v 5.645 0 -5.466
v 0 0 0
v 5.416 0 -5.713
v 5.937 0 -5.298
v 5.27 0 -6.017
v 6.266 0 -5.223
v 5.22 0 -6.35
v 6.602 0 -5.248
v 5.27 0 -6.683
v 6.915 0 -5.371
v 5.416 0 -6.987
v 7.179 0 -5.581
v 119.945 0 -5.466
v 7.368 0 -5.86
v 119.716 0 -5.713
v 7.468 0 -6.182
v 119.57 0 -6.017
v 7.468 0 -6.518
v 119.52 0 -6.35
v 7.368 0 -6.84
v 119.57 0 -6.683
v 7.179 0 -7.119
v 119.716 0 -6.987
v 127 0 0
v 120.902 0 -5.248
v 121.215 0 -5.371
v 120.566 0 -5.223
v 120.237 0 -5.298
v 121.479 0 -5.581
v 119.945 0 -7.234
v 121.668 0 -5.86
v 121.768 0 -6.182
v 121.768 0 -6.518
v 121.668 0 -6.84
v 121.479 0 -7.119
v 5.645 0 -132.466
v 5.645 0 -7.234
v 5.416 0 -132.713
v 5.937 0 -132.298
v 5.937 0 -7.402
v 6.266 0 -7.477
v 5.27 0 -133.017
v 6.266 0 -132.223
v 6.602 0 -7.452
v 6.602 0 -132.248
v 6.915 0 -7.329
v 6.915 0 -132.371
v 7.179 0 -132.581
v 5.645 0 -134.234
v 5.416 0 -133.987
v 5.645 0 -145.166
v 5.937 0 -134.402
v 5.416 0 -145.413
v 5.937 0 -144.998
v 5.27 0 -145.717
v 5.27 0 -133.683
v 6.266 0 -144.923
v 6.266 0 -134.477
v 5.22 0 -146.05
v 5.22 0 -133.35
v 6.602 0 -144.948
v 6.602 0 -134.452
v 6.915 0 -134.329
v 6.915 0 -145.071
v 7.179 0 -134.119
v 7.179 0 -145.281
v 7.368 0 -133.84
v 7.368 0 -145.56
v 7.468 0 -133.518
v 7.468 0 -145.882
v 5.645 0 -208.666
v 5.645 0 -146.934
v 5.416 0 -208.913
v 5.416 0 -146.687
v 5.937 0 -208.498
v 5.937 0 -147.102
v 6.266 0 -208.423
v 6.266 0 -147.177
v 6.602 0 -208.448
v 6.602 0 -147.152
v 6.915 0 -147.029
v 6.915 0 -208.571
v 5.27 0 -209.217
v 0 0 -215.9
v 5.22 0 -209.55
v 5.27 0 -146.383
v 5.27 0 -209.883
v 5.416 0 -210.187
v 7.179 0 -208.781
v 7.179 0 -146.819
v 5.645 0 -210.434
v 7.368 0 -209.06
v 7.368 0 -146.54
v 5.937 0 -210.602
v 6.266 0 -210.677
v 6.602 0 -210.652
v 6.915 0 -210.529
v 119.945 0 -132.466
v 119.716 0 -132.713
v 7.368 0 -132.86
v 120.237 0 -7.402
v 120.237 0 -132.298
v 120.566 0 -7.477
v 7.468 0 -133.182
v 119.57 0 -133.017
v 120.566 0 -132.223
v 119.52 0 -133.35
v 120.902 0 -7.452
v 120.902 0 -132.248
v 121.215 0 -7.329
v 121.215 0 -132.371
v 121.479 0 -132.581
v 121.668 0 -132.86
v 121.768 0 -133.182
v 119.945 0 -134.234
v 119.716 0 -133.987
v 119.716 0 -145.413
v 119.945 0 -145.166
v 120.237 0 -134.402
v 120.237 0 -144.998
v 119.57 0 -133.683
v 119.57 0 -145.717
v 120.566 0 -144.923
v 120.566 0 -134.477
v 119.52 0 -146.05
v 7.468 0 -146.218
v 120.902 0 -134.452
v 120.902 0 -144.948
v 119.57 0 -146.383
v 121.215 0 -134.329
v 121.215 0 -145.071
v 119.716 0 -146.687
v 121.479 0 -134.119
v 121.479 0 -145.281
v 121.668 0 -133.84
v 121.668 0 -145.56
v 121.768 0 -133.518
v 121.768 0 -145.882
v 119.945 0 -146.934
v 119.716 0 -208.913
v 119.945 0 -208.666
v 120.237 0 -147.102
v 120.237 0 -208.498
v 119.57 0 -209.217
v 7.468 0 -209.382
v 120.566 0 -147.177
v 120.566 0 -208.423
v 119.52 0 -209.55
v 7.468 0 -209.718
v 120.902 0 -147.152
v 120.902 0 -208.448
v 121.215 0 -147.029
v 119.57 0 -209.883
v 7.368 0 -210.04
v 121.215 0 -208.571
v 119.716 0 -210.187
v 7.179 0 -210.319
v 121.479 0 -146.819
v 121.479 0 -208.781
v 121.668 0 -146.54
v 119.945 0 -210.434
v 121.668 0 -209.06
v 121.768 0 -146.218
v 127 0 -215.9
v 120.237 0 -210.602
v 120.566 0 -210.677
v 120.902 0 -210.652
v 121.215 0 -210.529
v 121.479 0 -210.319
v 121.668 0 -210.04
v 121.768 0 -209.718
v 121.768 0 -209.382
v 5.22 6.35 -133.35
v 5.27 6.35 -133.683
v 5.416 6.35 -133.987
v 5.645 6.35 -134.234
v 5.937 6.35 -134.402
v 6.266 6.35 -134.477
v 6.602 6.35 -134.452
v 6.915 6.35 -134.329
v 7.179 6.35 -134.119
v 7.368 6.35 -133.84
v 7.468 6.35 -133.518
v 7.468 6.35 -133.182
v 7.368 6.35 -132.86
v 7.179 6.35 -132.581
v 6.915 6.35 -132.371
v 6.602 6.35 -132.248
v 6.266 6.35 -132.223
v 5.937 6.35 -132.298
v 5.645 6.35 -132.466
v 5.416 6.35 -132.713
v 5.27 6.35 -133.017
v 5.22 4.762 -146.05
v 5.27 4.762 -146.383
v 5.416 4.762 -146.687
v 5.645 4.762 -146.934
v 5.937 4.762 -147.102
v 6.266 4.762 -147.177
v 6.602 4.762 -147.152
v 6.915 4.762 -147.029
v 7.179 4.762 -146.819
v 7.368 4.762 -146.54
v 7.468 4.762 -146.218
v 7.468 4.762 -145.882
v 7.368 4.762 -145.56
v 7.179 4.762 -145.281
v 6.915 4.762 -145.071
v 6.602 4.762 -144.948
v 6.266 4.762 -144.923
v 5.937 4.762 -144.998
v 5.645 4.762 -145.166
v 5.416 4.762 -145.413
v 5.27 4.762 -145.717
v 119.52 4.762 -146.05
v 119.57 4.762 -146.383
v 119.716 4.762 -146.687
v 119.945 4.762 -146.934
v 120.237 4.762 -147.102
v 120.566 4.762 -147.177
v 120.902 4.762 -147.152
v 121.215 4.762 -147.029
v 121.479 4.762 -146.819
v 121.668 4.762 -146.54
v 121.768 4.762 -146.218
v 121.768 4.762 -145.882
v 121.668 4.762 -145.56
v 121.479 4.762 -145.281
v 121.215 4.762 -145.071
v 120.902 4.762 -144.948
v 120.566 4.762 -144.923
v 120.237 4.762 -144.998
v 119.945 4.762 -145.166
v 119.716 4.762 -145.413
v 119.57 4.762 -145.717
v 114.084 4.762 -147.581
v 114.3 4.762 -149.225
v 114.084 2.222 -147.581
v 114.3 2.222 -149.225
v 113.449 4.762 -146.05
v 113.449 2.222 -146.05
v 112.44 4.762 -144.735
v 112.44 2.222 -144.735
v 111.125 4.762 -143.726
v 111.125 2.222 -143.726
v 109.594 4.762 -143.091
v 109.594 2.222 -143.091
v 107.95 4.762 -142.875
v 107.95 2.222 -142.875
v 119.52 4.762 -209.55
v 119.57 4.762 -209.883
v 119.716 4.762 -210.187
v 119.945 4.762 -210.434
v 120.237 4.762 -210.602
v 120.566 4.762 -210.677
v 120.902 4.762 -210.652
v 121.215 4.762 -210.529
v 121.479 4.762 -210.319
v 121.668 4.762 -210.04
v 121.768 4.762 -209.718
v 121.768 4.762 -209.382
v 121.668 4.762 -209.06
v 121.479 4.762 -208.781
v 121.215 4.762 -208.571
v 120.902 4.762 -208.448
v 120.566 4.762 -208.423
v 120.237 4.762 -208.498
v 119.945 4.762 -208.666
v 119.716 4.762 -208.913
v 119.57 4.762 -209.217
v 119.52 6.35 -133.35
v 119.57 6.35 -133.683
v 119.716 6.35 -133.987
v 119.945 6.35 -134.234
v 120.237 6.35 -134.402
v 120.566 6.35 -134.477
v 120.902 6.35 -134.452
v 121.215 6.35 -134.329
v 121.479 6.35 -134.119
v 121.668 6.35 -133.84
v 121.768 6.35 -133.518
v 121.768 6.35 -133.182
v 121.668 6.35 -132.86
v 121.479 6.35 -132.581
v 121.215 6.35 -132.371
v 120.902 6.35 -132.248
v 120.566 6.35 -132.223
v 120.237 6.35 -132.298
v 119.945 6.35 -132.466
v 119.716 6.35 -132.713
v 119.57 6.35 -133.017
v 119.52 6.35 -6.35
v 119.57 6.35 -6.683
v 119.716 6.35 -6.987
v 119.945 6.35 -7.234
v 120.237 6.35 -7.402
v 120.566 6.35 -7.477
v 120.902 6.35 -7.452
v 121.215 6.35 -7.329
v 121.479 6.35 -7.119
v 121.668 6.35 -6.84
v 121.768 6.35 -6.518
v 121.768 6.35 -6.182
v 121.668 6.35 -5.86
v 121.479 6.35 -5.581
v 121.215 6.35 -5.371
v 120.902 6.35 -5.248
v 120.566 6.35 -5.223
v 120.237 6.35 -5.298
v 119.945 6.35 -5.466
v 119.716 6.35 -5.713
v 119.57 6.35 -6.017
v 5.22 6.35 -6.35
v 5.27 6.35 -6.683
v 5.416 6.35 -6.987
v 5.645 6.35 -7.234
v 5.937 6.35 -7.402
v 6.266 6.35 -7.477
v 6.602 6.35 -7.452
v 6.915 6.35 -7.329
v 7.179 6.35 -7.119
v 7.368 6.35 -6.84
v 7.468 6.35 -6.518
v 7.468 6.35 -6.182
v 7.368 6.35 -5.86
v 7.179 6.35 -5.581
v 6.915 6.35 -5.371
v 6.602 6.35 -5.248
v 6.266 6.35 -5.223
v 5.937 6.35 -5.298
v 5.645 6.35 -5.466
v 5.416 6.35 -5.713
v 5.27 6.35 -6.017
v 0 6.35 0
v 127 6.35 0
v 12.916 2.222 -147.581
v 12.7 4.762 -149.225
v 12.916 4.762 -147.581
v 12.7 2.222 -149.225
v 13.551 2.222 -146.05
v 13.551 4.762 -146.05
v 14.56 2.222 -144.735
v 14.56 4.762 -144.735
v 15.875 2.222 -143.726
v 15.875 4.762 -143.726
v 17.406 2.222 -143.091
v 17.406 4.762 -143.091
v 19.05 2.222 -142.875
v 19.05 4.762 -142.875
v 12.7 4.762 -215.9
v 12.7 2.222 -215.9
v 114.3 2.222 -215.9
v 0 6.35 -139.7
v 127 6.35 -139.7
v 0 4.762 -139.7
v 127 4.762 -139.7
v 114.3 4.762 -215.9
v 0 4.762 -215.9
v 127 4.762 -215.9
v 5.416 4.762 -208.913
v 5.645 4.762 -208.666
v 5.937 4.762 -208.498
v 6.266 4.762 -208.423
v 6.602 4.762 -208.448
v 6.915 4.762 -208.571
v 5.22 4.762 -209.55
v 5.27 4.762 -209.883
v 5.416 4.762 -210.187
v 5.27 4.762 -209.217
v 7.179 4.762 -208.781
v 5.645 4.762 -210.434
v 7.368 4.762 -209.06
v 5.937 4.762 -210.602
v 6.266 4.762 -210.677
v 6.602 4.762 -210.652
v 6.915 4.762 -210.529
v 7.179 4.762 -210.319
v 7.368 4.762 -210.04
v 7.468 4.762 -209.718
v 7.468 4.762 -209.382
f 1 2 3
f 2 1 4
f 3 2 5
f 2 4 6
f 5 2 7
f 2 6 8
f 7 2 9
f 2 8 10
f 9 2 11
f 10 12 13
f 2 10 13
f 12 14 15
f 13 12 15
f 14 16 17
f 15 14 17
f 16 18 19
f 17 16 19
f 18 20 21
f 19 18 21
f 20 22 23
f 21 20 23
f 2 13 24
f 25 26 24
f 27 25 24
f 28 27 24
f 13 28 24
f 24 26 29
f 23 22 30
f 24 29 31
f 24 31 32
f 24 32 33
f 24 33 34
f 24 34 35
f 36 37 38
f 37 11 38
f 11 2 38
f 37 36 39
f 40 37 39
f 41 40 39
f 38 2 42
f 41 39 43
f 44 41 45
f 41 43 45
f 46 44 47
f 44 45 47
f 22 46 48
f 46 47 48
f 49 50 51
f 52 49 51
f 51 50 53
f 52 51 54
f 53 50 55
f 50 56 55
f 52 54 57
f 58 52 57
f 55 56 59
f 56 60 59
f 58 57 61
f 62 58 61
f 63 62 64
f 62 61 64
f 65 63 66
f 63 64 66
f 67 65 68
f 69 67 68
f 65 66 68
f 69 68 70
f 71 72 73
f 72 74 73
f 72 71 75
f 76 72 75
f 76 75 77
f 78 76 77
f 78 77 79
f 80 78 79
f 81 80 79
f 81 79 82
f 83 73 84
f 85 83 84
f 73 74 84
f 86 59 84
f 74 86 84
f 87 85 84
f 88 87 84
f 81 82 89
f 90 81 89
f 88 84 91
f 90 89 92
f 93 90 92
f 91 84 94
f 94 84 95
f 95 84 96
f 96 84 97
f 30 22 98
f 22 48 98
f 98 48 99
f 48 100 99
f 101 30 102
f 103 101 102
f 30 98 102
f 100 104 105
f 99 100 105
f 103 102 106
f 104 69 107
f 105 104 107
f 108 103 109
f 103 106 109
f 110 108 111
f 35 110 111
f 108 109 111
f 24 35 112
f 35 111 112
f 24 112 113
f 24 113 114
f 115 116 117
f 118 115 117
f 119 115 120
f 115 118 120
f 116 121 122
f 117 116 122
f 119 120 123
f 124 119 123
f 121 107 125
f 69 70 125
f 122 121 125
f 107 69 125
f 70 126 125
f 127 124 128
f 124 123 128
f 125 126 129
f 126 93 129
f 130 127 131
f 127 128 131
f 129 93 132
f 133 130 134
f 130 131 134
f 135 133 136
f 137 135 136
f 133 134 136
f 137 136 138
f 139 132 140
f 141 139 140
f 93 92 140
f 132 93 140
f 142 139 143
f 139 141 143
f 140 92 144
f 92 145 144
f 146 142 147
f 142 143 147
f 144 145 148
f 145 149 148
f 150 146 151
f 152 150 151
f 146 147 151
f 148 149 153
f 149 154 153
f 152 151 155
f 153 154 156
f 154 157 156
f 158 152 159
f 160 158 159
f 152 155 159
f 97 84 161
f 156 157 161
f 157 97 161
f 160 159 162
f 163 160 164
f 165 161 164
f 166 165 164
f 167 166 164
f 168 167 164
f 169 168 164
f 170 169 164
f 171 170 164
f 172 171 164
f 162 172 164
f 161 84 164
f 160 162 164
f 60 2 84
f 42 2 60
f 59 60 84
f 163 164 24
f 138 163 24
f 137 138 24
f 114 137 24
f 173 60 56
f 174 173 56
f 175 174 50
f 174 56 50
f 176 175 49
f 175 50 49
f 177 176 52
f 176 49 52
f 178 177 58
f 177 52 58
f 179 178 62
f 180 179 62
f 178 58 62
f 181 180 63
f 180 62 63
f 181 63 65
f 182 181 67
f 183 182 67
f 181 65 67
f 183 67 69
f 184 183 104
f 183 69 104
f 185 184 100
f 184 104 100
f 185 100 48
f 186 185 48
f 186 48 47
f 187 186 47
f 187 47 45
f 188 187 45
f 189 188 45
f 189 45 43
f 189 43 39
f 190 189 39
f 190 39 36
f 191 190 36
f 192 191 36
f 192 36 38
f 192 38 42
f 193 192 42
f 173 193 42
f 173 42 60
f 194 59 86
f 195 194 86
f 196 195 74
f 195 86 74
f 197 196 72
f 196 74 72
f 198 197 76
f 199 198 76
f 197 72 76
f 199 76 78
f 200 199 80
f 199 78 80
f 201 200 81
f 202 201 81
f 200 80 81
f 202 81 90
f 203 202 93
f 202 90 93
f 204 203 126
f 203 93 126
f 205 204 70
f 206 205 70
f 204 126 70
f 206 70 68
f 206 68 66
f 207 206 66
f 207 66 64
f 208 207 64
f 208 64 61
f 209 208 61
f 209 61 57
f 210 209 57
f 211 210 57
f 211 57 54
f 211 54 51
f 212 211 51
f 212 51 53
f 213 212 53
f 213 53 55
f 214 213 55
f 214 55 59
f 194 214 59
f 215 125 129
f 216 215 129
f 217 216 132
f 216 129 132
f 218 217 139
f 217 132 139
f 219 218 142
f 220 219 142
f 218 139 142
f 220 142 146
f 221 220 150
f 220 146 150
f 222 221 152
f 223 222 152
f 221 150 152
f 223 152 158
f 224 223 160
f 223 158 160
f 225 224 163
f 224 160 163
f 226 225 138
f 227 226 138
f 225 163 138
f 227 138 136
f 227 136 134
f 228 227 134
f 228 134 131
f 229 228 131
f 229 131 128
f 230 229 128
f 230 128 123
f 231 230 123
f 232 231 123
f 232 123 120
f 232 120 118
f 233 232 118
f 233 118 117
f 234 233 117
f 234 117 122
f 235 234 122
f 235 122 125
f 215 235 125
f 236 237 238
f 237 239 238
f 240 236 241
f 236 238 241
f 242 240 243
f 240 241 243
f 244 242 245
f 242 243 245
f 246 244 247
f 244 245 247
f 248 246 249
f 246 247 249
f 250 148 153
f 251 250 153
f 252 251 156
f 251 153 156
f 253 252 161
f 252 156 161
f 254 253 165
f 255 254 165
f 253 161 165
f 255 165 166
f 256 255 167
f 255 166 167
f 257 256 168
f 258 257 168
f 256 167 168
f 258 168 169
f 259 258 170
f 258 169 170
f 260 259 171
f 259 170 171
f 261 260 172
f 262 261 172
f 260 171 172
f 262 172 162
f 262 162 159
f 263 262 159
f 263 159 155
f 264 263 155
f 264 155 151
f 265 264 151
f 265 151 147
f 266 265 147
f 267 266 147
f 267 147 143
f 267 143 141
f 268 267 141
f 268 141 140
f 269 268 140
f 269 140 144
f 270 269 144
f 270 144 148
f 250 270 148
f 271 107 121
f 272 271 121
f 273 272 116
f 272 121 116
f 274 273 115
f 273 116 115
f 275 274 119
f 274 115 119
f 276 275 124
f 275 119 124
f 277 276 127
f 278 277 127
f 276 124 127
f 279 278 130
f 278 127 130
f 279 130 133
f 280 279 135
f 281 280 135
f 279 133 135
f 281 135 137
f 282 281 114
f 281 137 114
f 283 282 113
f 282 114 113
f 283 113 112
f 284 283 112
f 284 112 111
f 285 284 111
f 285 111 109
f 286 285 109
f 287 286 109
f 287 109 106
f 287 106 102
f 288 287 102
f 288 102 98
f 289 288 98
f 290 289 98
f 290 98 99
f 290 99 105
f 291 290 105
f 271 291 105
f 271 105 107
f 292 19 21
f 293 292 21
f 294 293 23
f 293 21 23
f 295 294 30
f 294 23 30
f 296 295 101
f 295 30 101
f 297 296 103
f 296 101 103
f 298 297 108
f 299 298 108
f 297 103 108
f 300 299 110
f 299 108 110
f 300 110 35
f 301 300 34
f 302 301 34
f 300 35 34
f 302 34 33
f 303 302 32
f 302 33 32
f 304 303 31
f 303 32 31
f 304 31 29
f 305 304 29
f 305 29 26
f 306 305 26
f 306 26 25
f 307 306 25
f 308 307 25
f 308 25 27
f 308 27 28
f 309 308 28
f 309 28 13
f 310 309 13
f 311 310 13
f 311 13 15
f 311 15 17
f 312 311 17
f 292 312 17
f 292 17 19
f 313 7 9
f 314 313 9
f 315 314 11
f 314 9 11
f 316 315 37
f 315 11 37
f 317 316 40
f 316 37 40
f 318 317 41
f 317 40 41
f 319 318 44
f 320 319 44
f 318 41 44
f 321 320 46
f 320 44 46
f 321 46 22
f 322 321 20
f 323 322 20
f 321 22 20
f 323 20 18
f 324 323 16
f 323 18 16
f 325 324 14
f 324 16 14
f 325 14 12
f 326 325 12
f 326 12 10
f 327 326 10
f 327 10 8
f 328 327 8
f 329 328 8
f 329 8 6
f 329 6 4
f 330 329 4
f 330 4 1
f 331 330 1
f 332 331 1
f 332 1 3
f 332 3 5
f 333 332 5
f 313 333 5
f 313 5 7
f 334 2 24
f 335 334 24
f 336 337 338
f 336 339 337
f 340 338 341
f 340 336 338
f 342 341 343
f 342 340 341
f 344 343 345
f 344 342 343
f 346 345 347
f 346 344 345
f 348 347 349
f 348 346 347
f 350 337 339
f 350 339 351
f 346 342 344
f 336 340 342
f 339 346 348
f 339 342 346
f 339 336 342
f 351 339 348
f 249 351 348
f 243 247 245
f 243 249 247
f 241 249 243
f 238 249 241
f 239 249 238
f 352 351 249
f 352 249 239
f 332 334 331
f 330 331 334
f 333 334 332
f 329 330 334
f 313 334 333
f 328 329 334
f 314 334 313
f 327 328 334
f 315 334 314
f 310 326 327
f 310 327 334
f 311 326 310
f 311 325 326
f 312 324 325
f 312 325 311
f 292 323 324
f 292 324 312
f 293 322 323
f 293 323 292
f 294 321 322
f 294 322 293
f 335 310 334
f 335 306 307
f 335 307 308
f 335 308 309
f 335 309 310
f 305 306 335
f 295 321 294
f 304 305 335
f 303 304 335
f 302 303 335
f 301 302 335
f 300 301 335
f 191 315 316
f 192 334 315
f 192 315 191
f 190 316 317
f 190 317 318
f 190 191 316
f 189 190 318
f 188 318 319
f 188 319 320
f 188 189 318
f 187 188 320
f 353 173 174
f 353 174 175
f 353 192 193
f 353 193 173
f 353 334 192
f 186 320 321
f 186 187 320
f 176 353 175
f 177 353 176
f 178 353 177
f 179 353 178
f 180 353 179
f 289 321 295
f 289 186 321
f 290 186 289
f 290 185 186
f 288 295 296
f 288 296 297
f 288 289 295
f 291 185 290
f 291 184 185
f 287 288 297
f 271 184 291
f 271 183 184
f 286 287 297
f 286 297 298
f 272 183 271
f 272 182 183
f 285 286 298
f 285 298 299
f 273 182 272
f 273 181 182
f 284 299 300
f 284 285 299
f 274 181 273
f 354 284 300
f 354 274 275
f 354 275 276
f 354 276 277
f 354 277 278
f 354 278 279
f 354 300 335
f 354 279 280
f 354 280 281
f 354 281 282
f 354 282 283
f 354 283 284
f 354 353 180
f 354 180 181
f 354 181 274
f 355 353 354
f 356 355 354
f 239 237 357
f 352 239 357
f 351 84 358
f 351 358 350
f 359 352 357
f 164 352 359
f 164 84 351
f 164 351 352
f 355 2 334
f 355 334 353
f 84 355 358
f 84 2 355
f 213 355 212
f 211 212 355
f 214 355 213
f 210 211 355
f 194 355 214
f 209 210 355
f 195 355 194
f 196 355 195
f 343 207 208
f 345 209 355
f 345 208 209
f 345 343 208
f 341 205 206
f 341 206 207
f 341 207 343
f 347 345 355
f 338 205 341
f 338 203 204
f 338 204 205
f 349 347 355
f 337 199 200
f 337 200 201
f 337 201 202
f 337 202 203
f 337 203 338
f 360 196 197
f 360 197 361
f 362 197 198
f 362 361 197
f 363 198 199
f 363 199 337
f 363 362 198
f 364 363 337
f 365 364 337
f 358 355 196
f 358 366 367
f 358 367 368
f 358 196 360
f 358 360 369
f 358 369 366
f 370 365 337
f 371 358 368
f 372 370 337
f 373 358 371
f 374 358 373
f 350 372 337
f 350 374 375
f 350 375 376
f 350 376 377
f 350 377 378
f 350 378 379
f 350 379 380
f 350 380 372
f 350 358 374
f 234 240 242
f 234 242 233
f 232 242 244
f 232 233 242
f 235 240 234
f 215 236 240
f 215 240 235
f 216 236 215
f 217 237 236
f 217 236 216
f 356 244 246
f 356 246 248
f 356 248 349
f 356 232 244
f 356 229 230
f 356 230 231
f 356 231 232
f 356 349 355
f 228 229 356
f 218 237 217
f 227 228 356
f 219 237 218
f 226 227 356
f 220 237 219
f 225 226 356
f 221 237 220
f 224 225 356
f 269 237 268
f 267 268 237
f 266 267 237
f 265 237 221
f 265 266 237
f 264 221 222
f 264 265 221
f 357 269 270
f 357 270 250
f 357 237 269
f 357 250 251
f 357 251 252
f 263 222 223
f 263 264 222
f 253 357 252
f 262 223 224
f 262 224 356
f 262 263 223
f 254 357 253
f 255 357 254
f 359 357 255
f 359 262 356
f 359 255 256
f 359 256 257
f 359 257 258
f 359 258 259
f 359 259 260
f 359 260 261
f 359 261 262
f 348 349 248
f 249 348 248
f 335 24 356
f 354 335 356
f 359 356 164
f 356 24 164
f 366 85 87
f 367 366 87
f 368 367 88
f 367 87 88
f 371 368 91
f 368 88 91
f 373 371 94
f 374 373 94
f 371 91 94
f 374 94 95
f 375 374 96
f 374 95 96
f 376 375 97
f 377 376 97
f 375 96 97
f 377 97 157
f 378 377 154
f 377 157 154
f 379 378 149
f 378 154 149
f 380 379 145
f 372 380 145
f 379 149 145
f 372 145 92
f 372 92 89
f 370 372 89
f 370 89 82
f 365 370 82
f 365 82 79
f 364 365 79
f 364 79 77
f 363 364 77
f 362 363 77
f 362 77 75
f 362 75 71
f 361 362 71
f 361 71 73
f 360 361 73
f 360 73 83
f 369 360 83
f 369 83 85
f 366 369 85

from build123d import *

# Parameters (mm, degrees)
SKETCH1_W                   = 127
SKETCH1_H                   = 215.9
BOSS_EXTRUDE1_DEPTH         = 6.35
SKETCH3_W                   = 127
SKETCH3_H                   = 76.2
CUT_EXTRUDE1_DEPTH          = 1.5875
F_43_0_089_DIAMETER_HOLE1_D = 2.2606
F_43_0_089_DIAMETER_HOLE2_D = 2.2606
SKETCH8_W                   = 101.6
SKETCH8_H                   = 73.025
CUT_EXTRUDE2_DEPTH          = 2.54
FILLET1_R                   = 6.35


with BuildPart() as part:
    # Sketch1 → Boss-Extrude1 (new body)
    with BuildSketch(Plane(origin=(0, 0, 0), x_dir=(1, 0, 0), z_dir=(0, 1, 0))):
        with Locations((63.5, 107.95)):
            Rectangle(SKETCH1_W, SKETCH1_H)
    extrude(amount=BOSS_EXTRUDE1_DEPTH)

    # Sketch3 → Cut-Extrude1 (cut)
    with BuildSketch(Plane(origin=(0, 6.35, 0), x_dir=(1, 0, 0), z_dir=(0, 1, 0))):
        with Locations((63.5, 177.8)):
            Rectangle(SKETCH3_W, SKETCH3_H)
    extrude(amount=-CUT_EXTRUDE1_DEPTH, mode=Mode.SUBTRACT)

    # #43 (0.089) Diameter Hole1 (through all)
    with Locations(Plane(origin=(0, 4.7625, 0), x_dir=(1, 0, 0), z_dir=(0, 1, 0))):
        with Locations((6.35, 209.55), (6.35, 146.05), (120.65, 146.05), (120.65, 209.55)):
            Hole(F_43_0_089_DIAMETER_HOLE1_D / 2)

    # #43 (0.089) Diameter Hole2 (through all)
    with Locations(Plane(origin=(0, 6.35, 0), x_dir=(1, 0, 0), z_dir=(0, 1, 0))):
        with Locations((6.35, 6.35), (120.65, 6.35), (6.35, 133.35), (120.65, 133.35)):
            Hole(F_43_0_089_DIAMETER_HOLE2_D / 2)

    # Sketch8 → Cut-Extrude2 (cut)
    with BuildSketch(Plane(origin=(0, 4.7625, 0), x_dir=(1, 0, 0), z_dir=(0, 1, 0))):
        with Locations((63.5, 179.3875)):
            Rectangle(SKETCH8_W, SKETCH8_H)
    extrude(amount=-CUT_EXTRUDE2_DEPTH, mode=Mode.SUBTRACT)

    # Fillet1
    fillet1_edges = [part.edges().sort_by_distance(p)[0] for p in [
        (12.7, 3.4925, -142.875),
        (114.3, 3.4925, -142.875),
    ]]
    fillet(fillet1_edges, radius=FILLET1_R)


solid = part.part
